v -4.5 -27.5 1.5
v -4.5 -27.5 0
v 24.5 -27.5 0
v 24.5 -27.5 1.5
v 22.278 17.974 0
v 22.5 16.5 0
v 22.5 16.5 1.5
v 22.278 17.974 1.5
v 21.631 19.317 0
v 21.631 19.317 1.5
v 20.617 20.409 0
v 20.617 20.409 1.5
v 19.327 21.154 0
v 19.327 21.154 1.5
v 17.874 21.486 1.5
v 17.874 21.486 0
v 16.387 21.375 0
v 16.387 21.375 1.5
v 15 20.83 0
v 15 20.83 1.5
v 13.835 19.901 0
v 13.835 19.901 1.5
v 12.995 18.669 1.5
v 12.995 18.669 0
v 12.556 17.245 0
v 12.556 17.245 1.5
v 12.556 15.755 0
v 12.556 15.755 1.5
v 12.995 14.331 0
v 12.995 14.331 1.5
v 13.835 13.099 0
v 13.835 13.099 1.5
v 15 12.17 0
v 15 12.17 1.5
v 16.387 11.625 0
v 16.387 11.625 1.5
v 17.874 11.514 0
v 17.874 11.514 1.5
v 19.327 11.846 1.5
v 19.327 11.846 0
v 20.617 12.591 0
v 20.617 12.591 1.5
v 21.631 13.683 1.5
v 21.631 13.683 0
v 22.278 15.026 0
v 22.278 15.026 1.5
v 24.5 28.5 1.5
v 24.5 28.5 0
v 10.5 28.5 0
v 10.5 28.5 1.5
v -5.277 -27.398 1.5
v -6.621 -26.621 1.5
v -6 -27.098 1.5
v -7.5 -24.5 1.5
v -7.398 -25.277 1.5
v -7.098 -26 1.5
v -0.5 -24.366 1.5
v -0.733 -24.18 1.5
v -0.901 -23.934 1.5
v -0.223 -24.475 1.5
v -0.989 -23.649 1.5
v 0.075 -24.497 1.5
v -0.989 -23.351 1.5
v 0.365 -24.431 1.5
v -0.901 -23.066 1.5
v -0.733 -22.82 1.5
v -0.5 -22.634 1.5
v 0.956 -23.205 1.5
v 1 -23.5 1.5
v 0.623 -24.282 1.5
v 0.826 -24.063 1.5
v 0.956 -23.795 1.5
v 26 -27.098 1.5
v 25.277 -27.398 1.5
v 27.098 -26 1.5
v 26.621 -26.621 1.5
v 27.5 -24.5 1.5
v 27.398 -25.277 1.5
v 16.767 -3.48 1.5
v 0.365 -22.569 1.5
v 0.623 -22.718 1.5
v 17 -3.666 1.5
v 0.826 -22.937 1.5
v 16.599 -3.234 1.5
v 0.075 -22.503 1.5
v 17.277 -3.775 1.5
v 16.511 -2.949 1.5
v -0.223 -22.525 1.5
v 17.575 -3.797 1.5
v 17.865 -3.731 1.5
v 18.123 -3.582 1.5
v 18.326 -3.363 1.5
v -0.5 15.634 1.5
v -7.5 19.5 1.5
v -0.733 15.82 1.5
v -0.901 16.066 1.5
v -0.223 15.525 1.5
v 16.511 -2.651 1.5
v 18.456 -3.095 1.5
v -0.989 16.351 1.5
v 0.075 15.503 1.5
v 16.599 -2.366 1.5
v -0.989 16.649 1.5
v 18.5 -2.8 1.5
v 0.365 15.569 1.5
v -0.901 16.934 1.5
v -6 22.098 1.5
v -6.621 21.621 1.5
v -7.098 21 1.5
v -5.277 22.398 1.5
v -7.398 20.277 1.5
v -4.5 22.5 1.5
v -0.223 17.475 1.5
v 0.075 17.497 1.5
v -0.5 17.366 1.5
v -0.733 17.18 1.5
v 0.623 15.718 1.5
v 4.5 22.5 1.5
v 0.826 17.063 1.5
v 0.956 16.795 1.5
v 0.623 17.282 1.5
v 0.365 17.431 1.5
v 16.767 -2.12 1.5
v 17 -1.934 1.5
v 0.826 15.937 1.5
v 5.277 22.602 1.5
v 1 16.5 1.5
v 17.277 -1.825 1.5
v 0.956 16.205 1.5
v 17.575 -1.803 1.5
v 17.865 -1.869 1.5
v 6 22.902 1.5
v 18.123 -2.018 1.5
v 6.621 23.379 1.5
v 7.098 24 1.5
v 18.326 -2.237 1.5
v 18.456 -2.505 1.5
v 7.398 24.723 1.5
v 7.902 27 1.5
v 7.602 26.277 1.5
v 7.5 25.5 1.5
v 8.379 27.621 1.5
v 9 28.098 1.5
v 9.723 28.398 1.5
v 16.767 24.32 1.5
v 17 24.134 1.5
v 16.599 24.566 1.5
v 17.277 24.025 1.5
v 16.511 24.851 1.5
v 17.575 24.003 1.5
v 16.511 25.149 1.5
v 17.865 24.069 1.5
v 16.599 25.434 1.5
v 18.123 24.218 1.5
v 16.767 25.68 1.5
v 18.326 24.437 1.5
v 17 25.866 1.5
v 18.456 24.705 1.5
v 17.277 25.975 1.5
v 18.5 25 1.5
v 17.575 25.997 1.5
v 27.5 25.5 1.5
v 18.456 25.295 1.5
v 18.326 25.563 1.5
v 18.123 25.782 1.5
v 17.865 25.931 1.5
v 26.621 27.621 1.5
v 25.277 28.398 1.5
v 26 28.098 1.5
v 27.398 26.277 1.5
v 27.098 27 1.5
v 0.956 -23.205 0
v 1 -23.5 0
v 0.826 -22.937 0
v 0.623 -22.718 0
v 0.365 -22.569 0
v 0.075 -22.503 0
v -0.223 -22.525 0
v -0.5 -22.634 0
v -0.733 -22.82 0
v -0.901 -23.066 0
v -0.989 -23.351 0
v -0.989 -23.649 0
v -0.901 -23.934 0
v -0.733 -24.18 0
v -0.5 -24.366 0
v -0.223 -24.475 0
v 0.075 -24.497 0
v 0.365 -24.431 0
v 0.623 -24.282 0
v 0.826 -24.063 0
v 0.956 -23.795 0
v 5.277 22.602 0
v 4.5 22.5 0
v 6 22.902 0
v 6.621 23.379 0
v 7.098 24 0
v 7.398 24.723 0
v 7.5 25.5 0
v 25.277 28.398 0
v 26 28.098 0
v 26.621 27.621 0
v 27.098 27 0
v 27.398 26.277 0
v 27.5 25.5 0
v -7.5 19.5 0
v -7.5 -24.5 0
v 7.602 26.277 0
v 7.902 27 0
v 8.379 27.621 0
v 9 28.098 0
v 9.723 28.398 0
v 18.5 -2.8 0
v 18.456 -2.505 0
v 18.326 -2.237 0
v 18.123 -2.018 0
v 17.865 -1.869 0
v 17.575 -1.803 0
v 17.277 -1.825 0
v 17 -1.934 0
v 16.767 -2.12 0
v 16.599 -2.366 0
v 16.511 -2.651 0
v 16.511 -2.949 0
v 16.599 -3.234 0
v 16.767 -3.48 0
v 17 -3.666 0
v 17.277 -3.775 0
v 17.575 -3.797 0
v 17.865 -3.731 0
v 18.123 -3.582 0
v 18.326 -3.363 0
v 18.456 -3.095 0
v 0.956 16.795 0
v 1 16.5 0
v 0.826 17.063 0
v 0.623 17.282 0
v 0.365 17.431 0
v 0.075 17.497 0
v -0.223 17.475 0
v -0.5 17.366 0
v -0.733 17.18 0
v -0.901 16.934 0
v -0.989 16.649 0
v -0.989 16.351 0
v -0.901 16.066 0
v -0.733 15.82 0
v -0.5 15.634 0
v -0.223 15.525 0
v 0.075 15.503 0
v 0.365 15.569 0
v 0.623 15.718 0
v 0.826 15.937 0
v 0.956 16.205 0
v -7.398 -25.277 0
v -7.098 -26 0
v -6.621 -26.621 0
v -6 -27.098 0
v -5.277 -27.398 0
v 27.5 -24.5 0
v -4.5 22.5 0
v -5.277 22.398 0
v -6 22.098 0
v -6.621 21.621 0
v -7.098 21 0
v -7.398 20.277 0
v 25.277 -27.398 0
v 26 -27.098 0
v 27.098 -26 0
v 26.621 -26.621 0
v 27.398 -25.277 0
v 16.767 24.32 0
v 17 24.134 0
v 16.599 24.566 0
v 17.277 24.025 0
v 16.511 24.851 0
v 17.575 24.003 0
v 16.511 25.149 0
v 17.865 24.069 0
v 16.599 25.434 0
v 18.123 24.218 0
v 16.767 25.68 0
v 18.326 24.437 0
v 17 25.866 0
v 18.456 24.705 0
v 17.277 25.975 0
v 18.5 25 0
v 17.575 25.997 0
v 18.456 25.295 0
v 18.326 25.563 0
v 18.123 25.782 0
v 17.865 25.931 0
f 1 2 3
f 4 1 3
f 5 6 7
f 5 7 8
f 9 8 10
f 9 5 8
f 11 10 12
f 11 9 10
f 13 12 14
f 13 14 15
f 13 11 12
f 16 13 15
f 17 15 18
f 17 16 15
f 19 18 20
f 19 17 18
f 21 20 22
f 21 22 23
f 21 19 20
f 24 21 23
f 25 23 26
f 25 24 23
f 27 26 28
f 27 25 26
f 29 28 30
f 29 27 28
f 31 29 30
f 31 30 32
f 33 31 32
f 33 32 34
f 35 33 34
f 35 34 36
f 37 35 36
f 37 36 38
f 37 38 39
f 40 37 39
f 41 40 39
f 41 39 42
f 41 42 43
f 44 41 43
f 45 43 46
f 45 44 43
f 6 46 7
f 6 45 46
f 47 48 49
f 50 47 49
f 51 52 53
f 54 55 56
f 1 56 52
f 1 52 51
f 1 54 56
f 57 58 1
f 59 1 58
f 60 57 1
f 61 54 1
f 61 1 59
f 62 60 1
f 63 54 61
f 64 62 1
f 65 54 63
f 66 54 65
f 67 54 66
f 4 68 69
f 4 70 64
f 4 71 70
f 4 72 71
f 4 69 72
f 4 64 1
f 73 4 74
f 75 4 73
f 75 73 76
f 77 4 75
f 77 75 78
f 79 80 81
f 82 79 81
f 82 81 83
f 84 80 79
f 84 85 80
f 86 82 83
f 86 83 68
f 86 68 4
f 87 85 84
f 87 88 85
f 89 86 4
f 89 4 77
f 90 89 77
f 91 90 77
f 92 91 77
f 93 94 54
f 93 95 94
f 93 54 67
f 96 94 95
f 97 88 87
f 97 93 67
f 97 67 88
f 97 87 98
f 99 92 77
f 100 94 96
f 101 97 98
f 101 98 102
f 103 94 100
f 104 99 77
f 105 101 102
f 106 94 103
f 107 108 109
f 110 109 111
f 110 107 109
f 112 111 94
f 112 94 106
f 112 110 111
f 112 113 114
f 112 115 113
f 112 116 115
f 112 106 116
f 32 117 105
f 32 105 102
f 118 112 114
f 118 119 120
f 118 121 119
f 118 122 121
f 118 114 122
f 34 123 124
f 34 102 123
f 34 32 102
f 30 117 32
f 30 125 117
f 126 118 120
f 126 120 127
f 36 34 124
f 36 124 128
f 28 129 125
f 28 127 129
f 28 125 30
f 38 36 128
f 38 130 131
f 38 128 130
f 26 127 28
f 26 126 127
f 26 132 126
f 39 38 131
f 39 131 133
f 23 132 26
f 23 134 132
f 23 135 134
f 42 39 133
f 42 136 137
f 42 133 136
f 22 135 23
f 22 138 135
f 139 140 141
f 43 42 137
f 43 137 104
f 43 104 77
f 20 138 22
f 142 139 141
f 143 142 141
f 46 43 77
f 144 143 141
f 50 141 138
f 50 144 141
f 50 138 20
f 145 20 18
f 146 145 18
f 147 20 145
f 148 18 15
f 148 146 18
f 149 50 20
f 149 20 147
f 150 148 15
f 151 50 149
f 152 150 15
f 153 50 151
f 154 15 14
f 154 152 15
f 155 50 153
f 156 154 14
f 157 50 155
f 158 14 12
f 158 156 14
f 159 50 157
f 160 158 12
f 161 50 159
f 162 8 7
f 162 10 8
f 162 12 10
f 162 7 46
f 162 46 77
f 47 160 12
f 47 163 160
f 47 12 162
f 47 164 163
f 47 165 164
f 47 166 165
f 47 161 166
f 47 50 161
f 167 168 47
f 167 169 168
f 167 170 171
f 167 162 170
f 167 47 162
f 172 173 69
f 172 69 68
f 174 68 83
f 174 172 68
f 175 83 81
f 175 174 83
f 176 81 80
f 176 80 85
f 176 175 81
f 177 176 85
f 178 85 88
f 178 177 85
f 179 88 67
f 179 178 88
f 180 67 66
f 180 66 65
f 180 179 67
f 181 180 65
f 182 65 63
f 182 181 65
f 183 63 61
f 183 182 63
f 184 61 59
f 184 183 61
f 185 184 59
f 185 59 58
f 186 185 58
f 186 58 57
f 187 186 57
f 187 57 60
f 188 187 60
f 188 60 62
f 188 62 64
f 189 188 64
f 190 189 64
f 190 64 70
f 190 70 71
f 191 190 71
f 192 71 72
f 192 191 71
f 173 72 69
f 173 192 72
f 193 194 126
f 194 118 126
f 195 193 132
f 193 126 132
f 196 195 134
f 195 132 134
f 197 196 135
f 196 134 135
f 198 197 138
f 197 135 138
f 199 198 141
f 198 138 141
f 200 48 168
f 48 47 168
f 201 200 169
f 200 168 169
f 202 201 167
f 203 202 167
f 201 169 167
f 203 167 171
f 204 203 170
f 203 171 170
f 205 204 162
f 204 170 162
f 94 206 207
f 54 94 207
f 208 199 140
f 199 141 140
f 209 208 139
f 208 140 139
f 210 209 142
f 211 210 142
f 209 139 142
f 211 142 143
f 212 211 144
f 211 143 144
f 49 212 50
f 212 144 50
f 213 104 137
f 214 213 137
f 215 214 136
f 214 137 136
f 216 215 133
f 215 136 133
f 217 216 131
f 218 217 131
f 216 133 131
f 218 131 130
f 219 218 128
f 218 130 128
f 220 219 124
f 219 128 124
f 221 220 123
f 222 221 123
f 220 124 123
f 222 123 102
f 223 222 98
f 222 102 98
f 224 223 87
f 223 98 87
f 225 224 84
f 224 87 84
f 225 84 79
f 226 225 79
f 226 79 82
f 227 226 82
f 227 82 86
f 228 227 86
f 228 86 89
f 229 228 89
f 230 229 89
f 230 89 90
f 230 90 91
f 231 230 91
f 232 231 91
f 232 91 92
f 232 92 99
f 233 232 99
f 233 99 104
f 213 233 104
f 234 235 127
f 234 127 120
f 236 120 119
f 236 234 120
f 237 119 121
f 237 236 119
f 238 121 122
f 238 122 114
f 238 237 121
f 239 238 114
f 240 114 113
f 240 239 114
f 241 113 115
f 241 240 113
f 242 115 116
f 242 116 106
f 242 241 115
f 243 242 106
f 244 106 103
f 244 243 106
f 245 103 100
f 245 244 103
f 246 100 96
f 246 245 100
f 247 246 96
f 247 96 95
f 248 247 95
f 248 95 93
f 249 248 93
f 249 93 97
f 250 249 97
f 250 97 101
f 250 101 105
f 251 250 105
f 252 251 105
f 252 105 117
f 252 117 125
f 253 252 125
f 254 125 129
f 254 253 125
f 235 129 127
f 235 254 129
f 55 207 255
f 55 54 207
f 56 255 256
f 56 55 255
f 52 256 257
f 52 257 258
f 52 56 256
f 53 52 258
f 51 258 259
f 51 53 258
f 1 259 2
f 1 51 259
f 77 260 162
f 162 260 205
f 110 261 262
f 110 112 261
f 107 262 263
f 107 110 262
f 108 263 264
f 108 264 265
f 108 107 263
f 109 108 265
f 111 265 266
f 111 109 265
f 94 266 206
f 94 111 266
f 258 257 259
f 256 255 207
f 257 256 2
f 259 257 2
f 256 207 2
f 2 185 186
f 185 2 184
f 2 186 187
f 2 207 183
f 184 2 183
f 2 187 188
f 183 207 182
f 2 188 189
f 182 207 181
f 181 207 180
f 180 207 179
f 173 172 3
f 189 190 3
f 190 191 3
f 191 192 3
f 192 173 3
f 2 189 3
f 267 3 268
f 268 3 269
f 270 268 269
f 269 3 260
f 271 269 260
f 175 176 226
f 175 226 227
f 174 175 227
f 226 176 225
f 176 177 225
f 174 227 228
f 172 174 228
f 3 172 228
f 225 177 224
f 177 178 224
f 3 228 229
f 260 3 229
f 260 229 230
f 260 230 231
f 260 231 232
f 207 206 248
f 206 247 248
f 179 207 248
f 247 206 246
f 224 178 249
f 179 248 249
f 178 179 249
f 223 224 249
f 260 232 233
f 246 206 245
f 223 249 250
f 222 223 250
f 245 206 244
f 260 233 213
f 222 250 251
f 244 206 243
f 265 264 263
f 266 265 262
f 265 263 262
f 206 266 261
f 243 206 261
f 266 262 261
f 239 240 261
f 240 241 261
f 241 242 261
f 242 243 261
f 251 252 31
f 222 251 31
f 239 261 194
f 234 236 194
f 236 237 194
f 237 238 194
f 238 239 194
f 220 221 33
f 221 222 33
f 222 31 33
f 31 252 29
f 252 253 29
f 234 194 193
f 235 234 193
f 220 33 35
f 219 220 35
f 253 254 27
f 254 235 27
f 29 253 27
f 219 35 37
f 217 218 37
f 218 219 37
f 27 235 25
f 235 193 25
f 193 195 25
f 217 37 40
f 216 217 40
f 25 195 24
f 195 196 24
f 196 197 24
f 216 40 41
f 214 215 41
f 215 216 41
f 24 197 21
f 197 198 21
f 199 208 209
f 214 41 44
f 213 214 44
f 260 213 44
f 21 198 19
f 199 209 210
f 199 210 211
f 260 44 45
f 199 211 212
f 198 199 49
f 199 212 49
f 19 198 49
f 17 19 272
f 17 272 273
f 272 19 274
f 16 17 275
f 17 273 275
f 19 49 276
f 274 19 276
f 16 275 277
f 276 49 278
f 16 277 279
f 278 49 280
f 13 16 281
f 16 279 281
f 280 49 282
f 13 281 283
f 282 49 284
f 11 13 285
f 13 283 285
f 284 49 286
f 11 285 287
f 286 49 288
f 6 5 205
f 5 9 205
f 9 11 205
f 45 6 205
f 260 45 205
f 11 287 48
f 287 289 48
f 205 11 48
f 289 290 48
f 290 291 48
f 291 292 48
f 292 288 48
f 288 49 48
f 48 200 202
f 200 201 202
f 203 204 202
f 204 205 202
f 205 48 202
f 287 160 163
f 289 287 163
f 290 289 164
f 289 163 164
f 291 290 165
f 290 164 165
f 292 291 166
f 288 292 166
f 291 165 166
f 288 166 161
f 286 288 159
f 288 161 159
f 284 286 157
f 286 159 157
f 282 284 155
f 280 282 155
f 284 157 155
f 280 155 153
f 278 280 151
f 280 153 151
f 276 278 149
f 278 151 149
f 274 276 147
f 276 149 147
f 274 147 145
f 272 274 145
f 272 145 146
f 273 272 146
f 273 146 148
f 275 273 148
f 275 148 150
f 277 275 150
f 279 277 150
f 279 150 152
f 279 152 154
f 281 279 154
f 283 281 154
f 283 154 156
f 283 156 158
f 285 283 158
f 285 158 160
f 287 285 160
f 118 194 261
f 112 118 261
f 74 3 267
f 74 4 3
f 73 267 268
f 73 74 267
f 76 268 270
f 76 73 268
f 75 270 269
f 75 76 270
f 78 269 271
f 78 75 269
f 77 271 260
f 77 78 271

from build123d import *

# Parameters (mm, degrees)
SKETCH_1_R          = 1
SKETCH_1_R_2        = 5
EXTRUDE_1_DEPTH     = 1.5
SKETCH_3_R          = 1
CUT_EXTRUDE_1_DEPTH = 10
FILLET_1_R          = 3


with BuildPart() as part:
    # 草图1 → 凸台-拉伸1 (new body)
    with BuildSketch(Plane.XY):
        Polygon((7.5, 22.5), (-7.5, 22.5), (-7.5, -27.5), (7.5, -27.5), (27.5, -27.5), (27.5, 2.5), (27.5, 14.5), (27.5, 22.5), (27.5, 28.5), (7.5, 28.5), align=None)
        with Locations((0, -23.5)):
            Circle(SKETCH_1_R, mode=Mode.SUBTRACT)
        with Locations((0, 16.5)):
            Circle(SKETCH_1_R, mode=Mode.SUBTRACT)
        with Locations((17.5, 16.5)):
            Circle(SKETCH_1_R_2, mode=Mode.SUBTRACT)
    extrude(amount=EXTRUDE_1_DEPTH)

    # 草图3 → 切除-拉伸1 (cut)
    with BuildSketch(Plane.XY.offset(1.5)):
        with Locations((17.5, -2.8)):
            Circle(SKETCH_3_R)
        with Locations((17.5, 25)):
            Circle(SKETCH_3_R)
    extrude(amount=-CUT_EXTRUDE_1_DEPTH, mode=Mode.SUBTRACT)

    # 圆角1
    fillet_1_edges = [part.edges().sort_by_distance(p)[0] for p in [
        (7.5, 22.5, 0.75),
        (7.5, 28.5, 0.75),
        (-7.5, 22.5, 0.75),
        (27.5, 28.5, 0.75),
        (-7.5, -27.5, 0.75),
        (27.5, -27.5, 0.75),
    ]]
    fillet(fillet_1_edges, radius=FILLET_1_R - 0.0001)  # a hair under: the kernel refuses the full size


solid = part.part
